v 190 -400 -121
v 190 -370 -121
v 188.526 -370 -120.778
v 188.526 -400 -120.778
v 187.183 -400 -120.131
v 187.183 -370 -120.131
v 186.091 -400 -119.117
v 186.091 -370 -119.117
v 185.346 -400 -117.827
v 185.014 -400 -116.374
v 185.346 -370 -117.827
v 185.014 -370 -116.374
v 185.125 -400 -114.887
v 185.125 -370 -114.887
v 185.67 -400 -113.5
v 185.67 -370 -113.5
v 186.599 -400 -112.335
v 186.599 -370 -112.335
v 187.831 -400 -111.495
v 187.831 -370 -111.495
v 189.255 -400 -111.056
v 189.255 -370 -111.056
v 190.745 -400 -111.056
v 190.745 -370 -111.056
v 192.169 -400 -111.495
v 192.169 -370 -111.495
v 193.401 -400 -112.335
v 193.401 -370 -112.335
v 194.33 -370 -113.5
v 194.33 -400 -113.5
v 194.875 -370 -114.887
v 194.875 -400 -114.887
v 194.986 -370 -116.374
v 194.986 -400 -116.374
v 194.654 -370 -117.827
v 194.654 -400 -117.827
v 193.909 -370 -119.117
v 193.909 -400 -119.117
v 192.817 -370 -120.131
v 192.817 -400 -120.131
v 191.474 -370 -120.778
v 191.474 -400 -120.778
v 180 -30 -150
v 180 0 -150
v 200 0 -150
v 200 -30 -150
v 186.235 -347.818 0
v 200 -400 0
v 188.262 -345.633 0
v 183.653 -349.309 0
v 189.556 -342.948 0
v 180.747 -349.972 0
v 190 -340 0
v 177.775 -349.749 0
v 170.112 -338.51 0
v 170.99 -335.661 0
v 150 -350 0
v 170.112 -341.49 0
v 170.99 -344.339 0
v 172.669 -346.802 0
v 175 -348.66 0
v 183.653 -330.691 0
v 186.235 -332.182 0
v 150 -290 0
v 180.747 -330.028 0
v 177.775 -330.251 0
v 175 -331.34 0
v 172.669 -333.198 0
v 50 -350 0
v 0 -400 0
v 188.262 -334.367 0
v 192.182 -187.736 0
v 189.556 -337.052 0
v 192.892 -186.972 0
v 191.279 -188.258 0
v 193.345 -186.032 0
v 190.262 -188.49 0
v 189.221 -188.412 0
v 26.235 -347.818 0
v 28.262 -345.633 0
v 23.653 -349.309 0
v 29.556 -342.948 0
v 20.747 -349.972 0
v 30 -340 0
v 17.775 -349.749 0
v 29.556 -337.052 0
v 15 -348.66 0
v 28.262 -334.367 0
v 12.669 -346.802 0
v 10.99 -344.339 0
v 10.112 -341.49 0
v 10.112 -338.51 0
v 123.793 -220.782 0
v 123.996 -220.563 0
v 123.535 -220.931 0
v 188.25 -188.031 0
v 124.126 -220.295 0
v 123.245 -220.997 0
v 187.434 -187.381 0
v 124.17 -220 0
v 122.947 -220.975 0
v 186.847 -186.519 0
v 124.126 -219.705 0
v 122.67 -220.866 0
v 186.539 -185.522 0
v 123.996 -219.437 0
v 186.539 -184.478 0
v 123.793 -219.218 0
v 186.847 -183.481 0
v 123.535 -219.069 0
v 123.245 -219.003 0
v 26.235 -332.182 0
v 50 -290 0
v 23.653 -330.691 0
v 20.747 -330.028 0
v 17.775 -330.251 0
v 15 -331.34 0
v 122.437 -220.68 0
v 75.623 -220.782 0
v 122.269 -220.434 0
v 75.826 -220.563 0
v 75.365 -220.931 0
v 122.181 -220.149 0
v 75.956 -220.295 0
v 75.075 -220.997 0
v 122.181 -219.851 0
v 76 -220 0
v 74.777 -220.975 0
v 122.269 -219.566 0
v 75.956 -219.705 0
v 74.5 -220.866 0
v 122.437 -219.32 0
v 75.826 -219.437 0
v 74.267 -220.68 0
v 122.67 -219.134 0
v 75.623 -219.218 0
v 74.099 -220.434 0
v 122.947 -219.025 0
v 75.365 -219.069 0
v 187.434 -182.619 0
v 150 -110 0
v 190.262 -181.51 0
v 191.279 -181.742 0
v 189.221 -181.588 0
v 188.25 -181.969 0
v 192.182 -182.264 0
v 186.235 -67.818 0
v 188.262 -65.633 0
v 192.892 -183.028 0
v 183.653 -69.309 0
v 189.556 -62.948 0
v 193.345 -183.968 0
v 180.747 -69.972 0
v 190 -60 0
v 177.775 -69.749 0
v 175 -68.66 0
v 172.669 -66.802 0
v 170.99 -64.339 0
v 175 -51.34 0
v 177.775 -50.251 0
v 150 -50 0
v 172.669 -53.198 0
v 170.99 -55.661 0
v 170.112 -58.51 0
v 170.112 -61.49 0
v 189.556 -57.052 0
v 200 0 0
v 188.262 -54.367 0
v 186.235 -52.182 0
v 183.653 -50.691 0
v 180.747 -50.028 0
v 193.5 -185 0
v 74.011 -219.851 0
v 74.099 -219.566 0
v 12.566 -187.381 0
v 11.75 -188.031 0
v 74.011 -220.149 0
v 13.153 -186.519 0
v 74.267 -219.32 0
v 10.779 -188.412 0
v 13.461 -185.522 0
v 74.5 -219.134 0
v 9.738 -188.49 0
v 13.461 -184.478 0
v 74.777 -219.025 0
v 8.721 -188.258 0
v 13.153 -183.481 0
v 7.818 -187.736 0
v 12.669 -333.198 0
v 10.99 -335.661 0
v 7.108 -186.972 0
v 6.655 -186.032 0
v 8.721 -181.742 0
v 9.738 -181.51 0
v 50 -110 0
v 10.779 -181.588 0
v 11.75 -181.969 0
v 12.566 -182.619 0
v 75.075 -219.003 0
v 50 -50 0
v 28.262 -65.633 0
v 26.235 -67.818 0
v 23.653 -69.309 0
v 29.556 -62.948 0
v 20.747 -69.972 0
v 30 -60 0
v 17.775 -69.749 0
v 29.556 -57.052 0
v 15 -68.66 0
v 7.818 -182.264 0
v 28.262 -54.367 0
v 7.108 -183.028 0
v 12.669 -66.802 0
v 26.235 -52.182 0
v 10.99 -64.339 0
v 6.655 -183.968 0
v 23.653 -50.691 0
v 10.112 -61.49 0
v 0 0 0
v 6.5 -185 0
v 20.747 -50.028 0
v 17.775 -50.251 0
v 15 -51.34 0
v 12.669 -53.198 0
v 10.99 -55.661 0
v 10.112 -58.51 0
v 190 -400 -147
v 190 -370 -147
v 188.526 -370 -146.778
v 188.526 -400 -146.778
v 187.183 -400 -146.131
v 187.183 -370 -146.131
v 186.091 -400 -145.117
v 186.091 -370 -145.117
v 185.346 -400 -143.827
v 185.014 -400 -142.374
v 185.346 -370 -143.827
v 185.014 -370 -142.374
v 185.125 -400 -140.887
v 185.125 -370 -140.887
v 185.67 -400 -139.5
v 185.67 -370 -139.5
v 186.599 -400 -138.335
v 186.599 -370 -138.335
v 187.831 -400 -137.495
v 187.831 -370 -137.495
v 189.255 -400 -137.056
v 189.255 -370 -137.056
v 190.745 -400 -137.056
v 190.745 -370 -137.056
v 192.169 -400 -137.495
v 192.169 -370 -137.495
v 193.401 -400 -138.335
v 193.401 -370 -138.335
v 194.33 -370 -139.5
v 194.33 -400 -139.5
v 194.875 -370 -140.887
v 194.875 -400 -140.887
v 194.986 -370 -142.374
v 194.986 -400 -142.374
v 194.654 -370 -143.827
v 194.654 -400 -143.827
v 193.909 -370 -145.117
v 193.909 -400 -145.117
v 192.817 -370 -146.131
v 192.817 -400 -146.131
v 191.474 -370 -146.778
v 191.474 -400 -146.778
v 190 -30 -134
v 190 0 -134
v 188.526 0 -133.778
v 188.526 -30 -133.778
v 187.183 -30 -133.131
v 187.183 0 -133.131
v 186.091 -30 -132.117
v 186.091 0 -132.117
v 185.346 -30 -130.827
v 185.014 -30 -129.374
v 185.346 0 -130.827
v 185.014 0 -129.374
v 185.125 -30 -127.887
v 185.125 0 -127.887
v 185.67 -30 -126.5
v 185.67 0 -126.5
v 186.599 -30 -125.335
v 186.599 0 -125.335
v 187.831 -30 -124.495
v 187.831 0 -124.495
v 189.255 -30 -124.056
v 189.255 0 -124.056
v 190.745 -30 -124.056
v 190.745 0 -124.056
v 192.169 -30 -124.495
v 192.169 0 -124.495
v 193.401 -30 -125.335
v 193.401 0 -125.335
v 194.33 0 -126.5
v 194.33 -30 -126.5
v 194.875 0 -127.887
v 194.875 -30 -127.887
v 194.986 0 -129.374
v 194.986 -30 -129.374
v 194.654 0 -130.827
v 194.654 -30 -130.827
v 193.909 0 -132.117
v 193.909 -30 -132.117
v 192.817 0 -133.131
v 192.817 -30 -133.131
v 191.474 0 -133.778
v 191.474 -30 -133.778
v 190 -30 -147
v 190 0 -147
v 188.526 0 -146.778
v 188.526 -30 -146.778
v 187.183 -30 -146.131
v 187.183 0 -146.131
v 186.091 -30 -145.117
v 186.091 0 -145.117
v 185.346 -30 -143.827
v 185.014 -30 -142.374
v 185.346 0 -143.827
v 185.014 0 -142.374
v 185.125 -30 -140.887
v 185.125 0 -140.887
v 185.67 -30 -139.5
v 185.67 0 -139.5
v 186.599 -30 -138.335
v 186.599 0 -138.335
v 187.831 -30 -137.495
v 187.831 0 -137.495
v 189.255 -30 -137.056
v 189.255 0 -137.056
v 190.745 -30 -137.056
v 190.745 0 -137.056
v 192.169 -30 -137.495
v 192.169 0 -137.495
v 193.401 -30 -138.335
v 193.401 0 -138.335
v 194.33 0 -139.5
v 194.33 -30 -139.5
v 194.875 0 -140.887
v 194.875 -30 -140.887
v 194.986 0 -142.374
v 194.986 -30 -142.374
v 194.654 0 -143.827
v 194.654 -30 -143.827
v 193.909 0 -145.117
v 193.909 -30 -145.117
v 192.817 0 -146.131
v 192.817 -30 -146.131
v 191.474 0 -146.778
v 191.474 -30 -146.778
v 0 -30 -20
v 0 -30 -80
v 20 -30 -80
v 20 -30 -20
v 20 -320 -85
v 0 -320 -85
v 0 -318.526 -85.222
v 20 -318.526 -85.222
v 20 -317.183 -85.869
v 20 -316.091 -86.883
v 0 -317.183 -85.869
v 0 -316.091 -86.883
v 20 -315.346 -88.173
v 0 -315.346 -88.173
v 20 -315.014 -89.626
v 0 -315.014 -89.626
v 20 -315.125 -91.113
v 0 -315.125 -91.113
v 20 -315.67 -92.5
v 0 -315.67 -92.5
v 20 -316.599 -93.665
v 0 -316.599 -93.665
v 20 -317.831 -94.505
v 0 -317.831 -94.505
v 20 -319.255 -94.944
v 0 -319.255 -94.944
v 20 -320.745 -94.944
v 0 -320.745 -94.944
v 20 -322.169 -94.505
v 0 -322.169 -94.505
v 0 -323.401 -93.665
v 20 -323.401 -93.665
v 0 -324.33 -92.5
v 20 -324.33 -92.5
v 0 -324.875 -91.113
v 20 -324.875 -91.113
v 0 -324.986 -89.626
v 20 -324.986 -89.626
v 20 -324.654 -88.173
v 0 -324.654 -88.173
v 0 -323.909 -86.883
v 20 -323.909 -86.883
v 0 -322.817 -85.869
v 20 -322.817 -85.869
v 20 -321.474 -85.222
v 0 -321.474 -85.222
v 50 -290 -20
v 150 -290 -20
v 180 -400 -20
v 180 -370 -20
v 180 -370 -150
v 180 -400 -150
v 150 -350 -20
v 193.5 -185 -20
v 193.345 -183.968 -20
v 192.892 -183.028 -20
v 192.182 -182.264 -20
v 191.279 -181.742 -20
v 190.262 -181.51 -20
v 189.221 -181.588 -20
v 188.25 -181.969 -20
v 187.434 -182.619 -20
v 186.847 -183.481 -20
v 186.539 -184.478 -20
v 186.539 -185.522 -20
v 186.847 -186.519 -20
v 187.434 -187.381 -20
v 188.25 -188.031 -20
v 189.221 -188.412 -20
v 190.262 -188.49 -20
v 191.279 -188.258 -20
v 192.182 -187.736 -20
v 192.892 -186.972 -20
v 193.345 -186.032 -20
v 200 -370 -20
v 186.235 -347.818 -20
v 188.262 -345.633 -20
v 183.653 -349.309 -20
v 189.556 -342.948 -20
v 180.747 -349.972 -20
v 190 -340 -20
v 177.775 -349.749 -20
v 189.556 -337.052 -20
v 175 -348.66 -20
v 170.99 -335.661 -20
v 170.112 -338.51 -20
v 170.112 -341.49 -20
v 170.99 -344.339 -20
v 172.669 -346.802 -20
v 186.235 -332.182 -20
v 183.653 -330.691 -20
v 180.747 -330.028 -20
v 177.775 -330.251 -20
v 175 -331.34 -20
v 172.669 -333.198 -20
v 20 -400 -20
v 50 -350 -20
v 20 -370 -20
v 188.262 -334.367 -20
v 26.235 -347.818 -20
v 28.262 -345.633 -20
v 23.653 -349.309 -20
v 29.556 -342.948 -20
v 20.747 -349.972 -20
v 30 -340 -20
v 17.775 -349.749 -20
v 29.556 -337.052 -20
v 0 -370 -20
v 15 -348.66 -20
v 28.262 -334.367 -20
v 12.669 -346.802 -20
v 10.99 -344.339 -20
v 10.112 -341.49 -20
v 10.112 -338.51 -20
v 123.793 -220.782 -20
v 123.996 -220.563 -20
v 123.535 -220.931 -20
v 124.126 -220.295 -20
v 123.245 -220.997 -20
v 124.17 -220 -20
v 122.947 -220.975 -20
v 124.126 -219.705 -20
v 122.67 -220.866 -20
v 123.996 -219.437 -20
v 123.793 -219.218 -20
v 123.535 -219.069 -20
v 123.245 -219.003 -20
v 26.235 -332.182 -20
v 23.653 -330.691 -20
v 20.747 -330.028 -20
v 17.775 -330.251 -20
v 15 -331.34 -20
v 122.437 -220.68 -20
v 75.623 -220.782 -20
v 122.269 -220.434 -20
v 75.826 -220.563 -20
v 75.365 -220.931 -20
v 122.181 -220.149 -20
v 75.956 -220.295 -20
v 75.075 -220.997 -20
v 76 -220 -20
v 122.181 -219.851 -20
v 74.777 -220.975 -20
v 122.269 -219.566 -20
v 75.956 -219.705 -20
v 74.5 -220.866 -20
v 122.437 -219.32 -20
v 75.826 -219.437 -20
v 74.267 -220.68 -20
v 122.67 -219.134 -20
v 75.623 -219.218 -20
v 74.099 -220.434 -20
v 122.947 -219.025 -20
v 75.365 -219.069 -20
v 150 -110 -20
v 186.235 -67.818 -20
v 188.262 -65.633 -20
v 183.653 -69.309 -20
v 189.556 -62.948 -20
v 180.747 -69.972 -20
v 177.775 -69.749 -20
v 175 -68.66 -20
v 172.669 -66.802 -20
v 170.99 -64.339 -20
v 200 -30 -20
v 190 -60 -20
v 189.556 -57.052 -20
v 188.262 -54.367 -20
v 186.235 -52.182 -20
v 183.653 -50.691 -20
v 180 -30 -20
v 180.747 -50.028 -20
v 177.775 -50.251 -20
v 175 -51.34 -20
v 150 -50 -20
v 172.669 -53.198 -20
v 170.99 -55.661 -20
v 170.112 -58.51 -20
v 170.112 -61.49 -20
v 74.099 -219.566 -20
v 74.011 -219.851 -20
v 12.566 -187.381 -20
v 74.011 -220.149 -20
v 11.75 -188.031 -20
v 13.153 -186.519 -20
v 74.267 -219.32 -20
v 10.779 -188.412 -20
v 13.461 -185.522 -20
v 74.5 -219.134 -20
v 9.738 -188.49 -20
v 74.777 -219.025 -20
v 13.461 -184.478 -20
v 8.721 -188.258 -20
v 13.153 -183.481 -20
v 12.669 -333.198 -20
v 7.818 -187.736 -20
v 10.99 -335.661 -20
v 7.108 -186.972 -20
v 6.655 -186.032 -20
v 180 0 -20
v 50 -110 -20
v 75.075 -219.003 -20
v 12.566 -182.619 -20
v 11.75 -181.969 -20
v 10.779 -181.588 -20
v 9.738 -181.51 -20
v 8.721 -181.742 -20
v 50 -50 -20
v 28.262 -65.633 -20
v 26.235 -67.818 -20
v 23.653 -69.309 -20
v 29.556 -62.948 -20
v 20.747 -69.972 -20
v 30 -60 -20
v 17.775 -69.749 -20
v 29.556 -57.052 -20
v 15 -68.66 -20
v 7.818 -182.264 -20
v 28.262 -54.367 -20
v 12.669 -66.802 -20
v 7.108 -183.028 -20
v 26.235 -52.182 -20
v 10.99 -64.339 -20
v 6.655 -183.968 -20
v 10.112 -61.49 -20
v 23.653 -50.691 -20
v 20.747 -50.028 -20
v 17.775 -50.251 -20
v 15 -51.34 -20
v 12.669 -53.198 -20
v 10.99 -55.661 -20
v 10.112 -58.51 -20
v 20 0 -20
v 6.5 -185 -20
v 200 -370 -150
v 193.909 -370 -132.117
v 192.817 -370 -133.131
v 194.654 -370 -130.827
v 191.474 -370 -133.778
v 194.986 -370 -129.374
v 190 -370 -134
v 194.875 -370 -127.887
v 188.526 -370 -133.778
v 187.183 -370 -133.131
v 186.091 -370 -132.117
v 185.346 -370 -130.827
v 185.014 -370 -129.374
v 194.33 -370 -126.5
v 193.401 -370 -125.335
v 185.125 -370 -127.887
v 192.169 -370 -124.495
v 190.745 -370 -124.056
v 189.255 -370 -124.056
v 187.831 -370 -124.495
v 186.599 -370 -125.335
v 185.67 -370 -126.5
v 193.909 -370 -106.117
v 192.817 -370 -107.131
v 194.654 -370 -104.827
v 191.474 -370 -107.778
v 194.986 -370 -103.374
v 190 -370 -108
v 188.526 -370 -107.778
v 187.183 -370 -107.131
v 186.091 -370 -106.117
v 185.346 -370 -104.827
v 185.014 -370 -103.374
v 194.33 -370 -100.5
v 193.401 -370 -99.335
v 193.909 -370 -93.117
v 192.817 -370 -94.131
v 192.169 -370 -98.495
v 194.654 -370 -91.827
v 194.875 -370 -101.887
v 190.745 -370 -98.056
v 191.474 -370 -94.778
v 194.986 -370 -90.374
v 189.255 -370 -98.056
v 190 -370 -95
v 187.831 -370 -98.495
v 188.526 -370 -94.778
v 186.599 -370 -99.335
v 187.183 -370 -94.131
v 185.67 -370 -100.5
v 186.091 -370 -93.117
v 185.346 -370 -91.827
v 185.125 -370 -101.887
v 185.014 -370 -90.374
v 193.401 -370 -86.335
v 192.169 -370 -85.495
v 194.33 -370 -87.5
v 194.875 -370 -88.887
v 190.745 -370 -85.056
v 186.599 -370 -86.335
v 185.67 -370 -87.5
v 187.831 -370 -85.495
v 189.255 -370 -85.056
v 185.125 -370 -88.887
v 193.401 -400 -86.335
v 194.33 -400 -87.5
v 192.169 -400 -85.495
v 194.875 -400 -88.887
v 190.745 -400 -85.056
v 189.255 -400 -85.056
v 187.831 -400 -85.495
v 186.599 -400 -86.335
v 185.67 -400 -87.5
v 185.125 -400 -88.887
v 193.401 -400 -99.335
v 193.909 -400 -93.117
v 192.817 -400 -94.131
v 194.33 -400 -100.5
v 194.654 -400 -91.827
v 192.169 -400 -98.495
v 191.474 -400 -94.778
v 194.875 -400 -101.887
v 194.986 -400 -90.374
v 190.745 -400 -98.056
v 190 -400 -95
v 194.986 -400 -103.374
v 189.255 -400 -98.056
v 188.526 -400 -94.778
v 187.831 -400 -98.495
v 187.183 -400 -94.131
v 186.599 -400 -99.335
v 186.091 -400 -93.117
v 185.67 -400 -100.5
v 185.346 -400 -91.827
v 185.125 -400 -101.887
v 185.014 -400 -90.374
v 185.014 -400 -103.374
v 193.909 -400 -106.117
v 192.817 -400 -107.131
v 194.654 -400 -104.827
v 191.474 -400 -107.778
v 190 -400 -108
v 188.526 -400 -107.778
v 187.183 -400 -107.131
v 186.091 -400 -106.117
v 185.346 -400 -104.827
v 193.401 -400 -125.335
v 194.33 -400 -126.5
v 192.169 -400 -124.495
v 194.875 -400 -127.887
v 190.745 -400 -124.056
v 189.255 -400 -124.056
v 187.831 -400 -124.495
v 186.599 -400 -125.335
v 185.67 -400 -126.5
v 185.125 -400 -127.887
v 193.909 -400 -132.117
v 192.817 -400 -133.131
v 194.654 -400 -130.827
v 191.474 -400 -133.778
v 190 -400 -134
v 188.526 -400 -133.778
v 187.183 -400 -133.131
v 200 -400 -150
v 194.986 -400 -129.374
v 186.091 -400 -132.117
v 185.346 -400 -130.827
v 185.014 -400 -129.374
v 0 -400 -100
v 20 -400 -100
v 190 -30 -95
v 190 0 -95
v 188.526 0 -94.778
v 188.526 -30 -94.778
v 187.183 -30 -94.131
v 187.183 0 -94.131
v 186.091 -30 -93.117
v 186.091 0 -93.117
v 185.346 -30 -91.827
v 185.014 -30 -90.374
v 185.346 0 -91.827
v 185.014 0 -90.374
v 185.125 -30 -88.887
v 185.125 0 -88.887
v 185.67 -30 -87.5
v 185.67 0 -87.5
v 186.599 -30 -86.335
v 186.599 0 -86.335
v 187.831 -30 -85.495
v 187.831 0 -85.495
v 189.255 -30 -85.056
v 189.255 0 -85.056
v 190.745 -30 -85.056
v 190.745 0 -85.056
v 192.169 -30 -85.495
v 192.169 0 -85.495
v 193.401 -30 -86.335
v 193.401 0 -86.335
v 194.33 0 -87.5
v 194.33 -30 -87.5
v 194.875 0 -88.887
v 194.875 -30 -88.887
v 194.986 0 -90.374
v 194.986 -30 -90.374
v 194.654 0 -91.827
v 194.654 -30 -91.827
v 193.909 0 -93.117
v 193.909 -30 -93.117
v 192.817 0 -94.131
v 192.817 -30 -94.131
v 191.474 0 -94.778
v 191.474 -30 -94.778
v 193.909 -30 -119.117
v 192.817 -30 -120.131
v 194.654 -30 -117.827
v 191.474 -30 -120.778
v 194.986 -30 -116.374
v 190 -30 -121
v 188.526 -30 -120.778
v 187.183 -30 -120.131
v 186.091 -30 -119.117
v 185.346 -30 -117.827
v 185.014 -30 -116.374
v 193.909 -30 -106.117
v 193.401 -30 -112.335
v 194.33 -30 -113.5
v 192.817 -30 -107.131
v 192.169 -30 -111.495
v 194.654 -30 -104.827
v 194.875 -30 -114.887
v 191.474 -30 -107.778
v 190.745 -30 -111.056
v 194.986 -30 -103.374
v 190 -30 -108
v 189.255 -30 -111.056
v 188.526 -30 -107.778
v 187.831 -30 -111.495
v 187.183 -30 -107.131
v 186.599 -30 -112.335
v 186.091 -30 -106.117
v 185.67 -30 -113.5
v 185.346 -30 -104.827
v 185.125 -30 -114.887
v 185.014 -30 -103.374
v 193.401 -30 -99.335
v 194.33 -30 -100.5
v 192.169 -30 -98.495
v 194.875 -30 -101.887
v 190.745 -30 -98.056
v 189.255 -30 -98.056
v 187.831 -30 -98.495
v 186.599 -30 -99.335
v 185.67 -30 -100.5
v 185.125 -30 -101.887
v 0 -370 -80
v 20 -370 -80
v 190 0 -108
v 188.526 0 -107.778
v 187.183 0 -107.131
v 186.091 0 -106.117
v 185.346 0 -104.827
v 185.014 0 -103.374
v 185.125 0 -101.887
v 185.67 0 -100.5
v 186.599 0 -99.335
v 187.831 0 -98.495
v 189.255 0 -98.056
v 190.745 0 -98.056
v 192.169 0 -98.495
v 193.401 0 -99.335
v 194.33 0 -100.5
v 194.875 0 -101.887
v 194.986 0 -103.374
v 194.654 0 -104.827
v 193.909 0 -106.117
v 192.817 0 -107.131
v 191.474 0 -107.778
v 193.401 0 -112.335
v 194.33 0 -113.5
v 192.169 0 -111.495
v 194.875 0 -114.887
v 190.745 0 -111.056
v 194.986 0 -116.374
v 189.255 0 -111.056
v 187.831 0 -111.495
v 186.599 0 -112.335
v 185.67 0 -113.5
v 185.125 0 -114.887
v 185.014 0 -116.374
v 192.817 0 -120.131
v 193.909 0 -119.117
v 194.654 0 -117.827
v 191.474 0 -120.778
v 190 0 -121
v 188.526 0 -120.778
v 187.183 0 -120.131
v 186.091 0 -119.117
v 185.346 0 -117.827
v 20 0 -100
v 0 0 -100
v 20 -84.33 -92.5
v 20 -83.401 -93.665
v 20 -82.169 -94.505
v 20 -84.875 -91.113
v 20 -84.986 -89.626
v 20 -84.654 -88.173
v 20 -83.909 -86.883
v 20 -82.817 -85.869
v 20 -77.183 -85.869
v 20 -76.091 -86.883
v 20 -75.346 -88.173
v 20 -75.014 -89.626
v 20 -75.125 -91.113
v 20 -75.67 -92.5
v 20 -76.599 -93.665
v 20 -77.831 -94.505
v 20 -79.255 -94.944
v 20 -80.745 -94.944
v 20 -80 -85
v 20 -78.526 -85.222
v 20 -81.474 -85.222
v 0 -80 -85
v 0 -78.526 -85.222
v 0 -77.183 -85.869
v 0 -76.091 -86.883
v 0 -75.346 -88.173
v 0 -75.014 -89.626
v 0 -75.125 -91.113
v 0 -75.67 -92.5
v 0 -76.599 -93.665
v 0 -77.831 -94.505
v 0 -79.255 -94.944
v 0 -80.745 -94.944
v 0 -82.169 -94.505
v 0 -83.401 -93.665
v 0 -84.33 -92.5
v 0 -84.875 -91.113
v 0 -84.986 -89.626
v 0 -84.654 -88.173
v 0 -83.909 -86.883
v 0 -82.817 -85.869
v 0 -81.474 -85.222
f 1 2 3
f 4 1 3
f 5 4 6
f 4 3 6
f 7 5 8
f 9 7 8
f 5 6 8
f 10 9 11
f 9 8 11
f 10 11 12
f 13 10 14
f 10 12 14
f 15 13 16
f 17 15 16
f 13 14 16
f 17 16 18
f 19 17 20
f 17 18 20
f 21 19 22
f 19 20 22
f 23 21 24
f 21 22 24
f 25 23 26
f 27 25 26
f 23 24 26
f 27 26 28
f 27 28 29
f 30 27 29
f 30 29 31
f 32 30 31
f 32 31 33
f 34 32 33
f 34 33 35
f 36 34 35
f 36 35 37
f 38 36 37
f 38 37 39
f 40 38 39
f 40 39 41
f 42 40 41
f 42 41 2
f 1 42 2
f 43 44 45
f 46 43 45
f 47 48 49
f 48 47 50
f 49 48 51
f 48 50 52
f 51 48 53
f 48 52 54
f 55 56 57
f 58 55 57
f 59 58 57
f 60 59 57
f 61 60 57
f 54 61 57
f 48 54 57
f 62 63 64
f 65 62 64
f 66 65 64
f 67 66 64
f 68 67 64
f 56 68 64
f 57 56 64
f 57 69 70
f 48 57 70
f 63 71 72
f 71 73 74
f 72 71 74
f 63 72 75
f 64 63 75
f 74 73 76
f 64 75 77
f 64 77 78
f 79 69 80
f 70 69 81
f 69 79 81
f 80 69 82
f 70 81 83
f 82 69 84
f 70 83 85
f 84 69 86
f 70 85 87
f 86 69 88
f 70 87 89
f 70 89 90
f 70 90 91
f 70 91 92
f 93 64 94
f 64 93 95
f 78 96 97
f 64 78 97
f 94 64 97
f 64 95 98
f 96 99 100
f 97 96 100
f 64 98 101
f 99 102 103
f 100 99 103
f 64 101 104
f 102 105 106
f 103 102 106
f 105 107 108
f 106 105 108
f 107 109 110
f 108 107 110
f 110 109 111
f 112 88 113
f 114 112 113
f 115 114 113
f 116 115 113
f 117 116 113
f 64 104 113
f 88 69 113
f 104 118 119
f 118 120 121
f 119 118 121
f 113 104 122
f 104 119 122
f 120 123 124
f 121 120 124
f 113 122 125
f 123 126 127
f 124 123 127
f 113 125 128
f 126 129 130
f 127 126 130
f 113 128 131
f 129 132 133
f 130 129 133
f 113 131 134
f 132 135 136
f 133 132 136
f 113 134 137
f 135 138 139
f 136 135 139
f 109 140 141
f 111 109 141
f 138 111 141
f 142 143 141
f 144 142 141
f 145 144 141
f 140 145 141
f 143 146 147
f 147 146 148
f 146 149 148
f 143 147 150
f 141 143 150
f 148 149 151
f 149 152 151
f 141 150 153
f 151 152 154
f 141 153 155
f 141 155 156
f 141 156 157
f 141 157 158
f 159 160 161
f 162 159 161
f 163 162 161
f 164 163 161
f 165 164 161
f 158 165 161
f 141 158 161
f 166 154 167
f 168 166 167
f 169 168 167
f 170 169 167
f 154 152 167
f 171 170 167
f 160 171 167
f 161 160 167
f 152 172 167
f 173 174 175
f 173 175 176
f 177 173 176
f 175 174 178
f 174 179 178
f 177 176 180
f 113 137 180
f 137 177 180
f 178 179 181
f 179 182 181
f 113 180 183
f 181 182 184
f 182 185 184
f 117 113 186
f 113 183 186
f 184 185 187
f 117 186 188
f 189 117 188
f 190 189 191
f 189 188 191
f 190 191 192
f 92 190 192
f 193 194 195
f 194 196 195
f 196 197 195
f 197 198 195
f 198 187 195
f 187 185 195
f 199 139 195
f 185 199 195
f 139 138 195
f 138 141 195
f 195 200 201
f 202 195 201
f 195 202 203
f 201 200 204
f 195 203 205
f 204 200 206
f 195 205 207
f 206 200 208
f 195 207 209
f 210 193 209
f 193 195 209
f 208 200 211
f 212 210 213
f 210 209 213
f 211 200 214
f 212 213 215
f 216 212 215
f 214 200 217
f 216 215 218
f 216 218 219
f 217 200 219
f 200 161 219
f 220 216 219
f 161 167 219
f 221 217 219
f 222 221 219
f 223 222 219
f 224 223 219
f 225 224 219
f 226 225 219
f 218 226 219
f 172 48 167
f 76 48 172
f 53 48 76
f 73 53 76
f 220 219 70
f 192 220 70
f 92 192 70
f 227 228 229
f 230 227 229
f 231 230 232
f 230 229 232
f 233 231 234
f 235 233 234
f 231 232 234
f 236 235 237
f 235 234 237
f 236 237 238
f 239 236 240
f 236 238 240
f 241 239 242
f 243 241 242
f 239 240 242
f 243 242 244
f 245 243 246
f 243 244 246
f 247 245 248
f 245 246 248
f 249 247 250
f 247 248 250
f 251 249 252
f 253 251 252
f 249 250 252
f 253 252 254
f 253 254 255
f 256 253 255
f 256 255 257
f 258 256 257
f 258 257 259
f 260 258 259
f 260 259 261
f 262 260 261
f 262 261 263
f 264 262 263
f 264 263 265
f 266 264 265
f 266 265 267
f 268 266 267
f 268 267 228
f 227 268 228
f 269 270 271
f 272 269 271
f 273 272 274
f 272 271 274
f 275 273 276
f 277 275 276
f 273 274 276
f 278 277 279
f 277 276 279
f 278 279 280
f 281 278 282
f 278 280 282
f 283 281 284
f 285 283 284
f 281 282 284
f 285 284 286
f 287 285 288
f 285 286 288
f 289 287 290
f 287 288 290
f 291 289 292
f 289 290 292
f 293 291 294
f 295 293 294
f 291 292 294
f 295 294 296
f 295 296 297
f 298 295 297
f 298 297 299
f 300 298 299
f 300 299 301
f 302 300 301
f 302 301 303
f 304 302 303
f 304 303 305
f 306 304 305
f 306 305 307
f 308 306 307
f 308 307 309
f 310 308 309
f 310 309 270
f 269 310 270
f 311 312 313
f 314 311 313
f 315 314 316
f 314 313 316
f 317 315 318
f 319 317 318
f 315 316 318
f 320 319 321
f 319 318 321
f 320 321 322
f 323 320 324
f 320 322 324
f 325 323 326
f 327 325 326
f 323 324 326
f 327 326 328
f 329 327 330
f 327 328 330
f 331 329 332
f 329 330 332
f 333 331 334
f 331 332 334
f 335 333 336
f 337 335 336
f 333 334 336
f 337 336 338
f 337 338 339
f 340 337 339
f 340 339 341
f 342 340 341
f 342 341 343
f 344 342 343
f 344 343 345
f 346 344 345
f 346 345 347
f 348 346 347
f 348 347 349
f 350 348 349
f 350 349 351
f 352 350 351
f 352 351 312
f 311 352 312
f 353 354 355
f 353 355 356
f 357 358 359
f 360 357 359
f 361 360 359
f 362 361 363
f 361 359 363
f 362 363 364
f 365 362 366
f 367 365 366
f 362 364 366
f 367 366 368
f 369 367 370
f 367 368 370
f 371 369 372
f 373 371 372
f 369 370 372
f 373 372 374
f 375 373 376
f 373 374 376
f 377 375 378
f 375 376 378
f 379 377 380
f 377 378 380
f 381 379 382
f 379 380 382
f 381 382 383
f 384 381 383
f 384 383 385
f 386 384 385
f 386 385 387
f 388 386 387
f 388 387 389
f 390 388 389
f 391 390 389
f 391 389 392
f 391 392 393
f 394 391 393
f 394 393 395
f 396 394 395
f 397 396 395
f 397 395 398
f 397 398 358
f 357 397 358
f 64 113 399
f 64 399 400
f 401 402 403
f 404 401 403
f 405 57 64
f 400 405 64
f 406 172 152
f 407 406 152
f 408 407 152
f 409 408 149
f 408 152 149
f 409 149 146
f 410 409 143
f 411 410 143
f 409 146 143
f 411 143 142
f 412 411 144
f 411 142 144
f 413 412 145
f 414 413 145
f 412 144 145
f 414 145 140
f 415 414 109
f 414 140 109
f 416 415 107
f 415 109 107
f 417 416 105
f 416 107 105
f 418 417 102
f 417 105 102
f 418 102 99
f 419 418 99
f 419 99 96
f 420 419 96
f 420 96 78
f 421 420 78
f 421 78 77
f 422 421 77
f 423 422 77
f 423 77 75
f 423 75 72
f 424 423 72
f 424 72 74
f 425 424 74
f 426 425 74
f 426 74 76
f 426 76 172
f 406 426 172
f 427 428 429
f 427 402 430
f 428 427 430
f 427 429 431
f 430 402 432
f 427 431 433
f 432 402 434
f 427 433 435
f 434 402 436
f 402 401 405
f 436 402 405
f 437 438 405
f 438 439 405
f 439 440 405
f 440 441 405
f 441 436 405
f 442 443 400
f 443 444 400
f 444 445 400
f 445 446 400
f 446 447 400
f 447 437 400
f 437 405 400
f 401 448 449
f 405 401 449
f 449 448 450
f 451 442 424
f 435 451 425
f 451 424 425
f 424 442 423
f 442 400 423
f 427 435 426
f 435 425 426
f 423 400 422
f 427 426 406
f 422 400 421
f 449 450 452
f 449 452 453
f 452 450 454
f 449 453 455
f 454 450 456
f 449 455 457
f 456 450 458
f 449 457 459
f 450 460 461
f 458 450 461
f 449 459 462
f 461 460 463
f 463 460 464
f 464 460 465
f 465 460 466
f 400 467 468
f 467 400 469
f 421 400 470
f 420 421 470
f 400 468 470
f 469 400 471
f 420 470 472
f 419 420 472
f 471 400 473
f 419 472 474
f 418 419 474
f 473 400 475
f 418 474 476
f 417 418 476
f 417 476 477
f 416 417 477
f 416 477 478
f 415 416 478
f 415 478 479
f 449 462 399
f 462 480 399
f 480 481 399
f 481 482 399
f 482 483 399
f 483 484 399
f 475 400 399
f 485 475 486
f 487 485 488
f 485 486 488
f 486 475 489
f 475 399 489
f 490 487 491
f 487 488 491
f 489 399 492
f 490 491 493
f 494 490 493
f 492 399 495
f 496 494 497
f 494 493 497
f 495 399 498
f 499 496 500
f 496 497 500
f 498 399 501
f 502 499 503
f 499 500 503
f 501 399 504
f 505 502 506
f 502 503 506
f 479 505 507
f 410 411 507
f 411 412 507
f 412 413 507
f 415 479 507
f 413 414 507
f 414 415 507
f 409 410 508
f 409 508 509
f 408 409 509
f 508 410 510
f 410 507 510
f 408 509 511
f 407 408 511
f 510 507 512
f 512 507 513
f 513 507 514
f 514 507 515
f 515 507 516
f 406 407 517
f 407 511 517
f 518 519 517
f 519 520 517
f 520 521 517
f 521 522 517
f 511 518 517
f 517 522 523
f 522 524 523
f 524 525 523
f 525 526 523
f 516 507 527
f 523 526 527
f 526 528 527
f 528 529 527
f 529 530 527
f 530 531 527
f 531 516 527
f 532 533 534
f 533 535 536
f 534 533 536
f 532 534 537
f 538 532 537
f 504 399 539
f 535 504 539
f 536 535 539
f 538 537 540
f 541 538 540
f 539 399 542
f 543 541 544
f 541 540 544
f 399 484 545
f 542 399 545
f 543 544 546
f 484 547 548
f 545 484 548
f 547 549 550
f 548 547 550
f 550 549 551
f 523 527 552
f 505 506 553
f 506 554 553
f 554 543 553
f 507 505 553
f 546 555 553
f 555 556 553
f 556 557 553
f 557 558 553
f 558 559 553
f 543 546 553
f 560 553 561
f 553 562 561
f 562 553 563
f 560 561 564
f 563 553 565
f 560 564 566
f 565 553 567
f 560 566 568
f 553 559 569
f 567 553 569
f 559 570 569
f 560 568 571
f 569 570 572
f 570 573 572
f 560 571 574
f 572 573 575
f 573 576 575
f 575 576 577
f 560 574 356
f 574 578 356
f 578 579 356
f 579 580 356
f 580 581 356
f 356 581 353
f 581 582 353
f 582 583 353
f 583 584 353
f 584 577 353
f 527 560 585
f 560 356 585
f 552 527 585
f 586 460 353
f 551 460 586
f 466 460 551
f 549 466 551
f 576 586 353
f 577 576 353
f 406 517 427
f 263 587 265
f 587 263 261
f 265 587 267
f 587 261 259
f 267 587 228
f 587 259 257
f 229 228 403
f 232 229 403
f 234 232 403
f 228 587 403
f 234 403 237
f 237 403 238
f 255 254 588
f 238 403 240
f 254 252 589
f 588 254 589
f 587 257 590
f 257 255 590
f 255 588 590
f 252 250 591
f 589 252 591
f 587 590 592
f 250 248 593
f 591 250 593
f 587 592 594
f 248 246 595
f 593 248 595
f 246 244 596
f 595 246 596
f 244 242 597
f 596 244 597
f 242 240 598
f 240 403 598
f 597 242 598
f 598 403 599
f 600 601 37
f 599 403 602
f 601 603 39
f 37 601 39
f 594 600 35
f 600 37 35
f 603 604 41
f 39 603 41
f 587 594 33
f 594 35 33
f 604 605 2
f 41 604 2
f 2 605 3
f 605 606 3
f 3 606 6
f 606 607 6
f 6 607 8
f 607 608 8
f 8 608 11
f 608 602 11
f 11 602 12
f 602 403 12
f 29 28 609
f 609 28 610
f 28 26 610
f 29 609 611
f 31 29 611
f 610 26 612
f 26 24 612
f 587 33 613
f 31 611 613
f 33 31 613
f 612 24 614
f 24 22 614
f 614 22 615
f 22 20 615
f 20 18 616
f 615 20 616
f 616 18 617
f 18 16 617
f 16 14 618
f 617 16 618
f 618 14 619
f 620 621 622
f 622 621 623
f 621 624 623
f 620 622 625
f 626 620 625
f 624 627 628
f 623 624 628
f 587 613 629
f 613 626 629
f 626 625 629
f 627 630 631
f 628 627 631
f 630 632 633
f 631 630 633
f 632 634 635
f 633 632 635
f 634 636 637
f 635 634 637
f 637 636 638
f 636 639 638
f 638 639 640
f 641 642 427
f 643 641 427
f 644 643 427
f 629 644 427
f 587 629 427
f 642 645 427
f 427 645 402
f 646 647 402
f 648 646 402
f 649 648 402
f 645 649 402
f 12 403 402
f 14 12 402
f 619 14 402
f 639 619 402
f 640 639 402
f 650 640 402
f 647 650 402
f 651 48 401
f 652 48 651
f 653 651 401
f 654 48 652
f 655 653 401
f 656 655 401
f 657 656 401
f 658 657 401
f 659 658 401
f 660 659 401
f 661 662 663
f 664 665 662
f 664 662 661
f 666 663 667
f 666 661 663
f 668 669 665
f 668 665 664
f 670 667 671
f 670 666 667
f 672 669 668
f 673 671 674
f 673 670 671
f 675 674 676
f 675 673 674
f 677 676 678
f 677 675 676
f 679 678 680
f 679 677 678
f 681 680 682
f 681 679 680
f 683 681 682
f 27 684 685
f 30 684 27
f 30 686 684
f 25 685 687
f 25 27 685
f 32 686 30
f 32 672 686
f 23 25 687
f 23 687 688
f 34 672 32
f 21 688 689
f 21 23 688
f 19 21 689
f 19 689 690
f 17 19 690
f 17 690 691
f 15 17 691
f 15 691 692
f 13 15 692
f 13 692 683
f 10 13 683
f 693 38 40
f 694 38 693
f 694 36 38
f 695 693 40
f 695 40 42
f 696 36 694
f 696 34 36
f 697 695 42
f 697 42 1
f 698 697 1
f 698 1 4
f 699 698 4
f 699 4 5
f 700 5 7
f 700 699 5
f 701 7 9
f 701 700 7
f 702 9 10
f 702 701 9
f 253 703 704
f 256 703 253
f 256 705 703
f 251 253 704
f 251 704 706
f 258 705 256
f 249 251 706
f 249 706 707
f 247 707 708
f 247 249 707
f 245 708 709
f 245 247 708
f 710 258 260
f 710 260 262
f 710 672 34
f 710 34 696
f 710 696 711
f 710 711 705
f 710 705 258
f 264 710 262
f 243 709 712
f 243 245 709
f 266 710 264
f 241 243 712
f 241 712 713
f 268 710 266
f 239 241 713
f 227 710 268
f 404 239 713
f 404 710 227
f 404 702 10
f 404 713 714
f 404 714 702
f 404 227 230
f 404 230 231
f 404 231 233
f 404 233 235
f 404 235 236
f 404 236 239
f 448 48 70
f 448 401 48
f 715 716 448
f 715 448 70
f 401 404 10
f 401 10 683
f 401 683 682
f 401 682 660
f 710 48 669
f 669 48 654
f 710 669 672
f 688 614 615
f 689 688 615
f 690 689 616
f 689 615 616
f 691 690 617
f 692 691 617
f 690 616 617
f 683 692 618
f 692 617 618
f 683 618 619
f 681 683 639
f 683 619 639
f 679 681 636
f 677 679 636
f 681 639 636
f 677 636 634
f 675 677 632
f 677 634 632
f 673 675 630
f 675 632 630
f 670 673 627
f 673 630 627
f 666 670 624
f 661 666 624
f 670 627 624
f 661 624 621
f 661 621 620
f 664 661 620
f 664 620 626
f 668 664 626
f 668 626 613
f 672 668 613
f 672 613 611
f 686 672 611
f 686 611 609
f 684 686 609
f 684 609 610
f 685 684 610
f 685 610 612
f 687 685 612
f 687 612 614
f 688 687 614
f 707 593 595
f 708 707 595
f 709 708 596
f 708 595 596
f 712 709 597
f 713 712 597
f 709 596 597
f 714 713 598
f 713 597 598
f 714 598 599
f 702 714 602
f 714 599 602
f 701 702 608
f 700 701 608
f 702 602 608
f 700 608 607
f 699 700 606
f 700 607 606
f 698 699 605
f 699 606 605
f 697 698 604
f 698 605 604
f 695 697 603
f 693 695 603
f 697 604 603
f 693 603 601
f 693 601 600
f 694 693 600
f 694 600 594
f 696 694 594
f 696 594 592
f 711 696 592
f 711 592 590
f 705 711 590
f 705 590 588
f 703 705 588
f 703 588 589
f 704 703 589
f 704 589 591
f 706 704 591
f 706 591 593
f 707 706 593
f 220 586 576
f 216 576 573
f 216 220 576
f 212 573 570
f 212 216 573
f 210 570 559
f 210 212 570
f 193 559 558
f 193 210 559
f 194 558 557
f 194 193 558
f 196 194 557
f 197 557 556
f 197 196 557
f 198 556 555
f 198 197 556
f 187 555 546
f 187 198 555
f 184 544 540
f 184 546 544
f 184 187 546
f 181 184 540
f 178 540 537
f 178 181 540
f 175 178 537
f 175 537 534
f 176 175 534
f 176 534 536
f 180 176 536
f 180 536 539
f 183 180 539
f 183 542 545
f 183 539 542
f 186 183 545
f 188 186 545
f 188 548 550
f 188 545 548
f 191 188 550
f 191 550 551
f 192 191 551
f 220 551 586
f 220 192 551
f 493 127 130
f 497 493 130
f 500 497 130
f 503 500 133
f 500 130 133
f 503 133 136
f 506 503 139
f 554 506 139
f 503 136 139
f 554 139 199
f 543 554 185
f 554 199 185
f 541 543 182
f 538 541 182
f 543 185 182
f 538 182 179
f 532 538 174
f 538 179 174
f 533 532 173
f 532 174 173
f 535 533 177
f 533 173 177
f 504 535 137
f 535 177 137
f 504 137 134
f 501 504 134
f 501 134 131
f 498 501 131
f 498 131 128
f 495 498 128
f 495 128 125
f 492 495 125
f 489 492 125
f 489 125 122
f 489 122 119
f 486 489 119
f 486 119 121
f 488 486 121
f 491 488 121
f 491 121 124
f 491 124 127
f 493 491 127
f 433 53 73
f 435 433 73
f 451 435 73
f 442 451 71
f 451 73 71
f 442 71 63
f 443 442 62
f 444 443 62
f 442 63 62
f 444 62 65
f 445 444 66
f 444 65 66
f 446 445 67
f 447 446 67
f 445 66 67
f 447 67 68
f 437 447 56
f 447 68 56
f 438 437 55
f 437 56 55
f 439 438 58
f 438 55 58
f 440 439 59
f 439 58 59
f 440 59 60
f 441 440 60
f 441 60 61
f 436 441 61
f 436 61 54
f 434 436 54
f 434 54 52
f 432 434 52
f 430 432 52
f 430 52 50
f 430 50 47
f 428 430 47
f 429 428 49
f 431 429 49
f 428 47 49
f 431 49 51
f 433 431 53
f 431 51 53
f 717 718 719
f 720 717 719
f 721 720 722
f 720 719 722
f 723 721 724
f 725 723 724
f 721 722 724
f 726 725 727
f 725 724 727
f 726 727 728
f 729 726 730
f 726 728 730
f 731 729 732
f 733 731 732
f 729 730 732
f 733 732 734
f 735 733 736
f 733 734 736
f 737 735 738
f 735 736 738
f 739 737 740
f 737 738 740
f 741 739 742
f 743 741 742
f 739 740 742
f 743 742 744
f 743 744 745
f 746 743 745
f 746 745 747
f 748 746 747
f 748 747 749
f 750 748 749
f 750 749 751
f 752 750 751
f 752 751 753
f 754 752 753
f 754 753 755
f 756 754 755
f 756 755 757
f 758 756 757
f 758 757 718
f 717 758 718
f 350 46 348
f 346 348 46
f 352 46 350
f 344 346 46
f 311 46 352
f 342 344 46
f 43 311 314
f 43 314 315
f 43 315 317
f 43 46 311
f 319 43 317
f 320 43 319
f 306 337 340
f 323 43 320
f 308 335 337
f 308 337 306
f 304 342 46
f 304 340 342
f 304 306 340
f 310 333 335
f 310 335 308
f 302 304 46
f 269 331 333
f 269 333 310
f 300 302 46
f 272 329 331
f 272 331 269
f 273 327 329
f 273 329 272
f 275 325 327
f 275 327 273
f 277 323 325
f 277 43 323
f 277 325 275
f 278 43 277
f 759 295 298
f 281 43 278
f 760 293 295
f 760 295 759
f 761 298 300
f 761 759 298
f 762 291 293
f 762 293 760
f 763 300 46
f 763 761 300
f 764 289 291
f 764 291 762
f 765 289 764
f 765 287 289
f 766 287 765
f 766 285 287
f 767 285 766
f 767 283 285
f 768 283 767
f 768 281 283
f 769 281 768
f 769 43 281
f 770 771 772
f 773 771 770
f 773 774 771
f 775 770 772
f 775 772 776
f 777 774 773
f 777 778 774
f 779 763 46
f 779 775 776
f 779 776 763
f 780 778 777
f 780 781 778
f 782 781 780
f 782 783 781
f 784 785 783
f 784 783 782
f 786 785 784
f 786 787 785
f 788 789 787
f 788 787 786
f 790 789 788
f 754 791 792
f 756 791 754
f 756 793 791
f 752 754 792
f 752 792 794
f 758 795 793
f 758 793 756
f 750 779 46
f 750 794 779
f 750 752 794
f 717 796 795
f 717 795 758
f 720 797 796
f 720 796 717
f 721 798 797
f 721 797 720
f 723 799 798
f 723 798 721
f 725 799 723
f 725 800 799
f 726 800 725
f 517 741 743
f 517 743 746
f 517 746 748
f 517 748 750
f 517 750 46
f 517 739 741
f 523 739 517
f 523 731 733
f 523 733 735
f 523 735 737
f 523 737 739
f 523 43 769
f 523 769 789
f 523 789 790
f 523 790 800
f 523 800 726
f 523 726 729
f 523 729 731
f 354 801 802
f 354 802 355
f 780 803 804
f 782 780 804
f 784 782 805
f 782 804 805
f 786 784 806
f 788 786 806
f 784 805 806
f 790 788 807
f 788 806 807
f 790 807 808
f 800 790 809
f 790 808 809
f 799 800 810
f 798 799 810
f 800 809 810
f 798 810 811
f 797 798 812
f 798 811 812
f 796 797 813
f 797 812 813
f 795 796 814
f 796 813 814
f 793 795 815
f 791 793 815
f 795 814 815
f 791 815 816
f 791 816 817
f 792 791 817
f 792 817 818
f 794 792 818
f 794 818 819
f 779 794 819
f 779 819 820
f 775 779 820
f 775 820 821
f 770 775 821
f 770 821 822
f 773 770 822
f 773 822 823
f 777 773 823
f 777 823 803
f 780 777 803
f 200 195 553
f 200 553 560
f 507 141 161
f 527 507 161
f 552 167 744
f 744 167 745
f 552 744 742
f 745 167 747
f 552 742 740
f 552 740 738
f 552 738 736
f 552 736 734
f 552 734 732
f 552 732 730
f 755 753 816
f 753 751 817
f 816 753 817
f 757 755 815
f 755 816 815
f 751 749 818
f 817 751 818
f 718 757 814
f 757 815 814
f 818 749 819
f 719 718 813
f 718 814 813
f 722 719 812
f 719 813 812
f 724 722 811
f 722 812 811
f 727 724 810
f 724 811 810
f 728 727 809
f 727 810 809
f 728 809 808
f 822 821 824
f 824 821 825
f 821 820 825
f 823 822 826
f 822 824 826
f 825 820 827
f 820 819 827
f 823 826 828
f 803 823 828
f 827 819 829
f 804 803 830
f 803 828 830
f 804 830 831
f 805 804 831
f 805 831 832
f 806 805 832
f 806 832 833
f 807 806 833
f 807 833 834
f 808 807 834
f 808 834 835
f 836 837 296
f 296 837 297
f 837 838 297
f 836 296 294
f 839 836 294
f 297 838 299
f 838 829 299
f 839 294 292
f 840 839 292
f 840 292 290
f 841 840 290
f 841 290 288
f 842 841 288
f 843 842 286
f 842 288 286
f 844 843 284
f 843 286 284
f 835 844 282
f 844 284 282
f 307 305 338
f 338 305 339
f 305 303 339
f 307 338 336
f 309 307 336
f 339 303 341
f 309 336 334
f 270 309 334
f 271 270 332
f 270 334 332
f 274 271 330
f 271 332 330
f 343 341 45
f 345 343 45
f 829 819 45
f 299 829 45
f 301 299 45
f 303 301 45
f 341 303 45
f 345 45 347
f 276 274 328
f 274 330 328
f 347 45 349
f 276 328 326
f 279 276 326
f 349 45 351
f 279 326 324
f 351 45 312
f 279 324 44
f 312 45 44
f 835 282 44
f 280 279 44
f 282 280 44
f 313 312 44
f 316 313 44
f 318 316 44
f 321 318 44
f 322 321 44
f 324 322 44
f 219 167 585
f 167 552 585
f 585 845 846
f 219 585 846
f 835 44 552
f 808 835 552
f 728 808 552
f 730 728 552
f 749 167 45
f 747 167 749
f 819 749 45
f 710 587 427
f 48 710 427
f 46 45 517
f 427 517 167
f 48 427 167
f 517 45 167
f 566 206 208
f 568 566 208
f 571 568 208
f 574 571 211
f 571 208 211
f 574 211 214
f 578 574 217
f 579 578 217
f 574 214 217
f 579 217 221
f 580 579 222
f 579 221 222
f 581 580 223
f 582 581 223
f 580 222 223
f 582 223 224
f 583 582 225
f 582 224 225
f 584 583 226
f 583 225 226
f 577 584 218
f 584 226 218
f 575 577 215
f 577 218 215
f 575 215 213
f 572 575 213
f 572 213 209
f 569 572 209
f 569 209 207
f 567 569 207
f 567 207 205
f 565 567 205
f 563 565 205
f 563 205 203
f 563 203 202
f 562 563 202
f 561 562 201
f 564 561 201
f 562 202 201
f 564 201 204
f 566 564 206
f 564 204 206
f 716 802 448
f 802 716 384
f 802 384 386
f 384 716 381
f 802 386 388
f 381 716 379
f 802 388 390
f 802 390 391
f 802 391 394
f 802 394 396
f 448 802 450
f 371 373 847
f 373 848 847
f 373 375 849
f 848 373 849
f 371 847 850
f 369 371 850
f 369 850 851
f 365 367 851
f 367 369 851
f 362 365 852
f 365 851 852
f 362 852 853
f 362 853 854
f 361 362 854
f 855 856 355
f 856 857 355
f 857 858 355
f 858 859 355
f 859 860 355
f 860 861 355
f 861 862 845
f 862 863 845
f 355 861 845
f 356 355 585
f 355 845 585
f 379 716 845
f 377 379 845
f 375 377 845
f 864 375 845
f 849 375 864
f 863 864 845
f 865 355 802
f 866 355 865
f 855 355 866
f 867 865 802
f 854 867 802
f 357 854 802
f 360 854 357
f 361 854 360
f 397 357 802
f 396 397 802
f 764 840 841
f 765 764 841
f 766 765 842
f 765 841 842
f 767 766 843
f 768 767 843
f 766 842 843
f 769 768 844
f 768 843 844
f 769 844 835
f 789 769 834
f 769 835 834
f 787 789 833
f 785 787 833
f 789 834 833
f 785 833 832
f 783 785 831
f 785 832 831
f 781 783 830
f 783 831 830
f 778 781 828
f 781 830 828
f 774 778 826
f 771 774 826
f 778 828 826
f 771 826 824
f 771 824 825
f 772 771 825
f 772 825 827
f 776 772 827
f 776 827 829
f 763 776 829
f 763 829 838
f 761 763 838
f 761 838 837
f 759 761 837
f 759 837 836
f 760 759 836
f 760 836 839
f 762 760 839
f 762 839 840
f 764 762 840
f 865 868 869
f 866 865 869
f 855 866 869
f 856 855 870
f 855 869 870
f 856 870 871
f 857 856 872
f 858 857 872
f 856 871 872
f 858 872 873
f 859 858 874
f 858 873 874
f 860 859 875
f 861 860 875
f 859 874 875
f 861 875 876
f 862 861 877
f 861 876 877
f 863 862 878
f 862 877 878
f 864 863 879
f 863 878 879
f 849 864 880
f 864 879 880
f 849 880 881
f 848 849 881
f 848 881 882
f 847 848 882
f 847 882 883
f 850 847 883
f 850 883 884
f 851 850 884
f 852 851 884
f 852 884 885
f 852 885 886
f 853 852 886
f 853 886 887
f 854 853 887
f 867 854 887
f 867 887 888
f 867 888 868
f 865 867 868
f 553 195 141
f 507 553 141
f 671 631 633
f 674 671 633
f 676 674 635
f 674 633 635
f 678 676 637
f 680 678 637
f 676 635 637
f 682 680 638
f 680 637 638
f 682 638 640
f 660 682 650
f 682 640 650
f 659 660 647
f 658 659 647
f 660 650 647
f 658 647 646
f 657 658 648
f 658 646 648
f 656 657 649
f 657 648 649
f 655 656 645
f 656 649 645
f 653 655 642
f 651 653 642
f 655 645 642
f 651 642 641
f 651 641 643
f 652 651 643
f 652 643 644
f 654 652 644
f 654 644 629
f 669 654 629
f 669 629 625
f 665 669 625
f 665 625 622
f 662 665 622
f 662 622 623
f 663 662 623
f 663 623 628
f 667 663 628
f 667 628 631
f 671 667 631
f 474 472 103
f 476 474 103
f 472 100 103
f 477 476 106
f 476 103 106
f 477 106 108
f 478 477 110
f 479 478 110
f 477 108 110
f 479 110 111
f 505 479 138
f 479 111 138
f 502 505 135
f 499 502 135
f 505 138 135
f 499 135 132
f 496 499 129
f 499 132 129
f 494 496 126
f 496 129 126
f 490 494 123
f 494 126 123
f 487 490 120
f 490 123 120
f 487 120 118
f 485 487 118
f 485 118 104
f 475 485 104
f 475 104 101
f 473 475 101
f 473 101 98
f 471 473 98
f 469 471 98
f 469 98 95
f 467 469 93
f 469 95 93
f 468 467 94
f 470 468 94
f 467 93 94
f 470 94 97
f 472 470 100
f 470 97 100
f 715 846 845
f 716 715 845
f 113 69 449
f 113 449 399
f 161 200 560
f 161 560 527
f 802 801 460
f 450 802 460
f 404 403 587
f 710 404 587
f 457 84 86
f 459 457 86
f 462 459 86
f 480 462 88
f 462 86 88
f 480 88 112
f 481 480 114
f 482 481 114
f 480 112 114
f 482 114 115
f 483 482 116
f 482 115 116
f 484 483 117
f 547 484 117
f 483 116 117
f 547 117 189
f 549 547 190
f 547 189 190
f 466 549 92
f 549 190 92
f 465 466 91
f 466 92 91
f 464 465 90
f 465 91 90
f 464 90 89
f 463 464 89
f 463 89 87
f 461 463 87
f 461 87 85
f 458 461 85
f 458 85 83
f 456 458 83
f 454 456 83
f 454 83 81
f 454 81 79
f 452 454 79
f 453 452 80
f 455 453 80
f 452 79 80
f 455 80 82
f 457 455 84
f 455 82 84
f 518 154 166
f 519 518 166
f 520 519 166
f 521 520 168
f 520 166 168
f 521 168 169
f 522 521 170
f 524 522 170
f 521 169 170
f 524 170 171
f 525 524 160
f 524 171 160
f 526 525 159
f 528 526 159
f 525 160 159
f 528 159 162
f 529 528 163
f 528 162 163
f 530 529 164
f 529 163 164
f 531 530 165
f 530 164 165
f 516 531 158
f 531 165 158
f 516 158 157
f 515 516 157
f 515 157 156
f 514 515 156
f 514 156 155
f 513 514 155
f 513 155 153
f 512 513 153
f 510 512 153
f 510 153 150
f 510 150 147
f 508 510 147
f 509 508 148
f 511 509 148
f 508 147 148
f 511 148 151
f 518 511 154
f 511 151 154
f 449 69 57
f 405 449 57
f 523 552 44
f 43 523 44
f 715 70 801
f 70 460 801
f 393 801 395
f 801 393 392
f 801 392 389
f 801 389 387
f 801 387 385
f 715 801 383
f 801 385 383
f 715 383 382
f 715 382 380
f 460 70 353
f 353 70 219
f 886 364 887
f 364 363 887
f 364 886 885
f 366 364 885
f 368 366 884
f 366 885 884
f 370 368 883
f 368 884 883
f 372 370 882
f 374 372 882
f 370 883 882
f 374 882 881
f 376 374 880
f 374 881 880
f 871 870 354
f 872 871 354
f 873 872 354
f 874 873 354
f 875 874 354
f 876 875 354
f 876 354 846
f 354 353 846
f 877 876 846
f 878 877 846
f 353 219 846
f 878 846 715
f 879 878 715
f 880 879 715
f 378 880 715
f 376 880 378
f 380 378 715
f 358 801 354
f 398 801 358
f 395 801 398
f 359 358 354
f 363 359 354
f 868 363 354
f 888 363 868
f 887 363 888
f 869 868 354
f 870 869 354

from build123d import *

# Parameters (mm, degrees)
BOSS_EXTRUDE1_DEPTH = 400
SKETCH3_W           = 100
SKETCH3_H           = 300
CUT_EXTRUDE1_DEPTH  = 400
SKETCH4_W           = 60
SKETCH4_H           = 340
CUT_EXTRUDE2_DEPTH  = 400
SKETCH5_W           = 70
SKETCH5_H           = 340
CUT_EXTRUDE4_DEPTH  = 118
SKETCH6_R           = 5
CUT_EXTRUDE5_DEPTH  = 543
SKETCH7_R           = 5
CUT_EXTRUDE6_DEPTH  = 193
SKETCH8_R           = 10
CUT_EXTRUDE7_DEPTH  = 20
SKETCH9_W           = 100
SKETCH9_H           = 180
BOSS_EXTRUDE2_DEPTH = 20
SKETCH11_R          = 1
CUT_EXTRUDE8_DEPTH  = 26.5
SKETCH12_R          = 3.5
CUT_EXTRUDE9_DEPTH  = 35


with BuildPart() as part:
    # Sketch2 → Boss-Extrude1 (new body)
    with BuildSketch(Plane(origin=(0, 0, 0), x_dir=(1, 0, 0), z_dir=(0, 1, 0))):
        Polygon((0, 0), (0, 100), (20, 100), (20, 20), (180, 20), (180, 150), (200, 150), (200, 0), align=None)
    extrude(amount=-BOSS_EXTRUDE1_DEPTH)

    # Sketch3 → Cut-Extrude1 (cut)
    with BuildSketch(Plane.XY):
        with Locations((100, -200)):
            Rectangle(SKETCH3_W, SKETCH3_H)
    extrude(amount=-CUT_EXTRUDE1_DEPTH, mode=Mode.SUBTRACT)

    # Sketch4 → Cut-Extrude2 (cut)
    with BuildSketch(Plane.ZY):
        with Locations((-50, -200)):
            Rectangle(SKETCH4_W, SKETCH4_H)
    extrude(amount=-CUT_EXTRUDE2_DEPTH, mode=Mode.SUBTRACT)

    # Sketch5 → Cut-Extrude4 (cut)
    with BuildSketch(Plane(origin=(200, 0, 0), x_dir=(0, 0, -1), z_dir=(1, 0, 0))):
        with Locations((115, -200)):
            Rectangle(SKETCH5_W, SKETCH5_H)
    extrude(amount=-CUT_EXTRUDE4_DEPTH, mode=Mode.SUBTRACT)

    # Sketch6 → Cut-Extrude5 (cut)
    with BuildSketch(Plane(origin=(0, 0, 0), x_dir=(1, 0, 0), z_dir=(0, 1, 0))):
        with Locations(Location((190, 142, 0), (0, 0, 90))):
            Circle(SKETCH6_R)
        with Locations(Location((190, 129, 0), (0, 0, 90))):
            Circle(SKETCH6_R)
        with Locations(Location((190, 116, 0), (0, 0, 90))):
            Circle(SKETCH6_R)
        with Locations(Location((190, 103, 0), (0, 0, 90))):
            Circle(SKETCH6_R)
        with Locations(Location((190, 90, 0), (0, 0, 90))):
            Circle(SKETCH6_R)
    extrude(amount=-CUT_EXTRUDE5_DEPTH, mode=Mode.SUBTRACT)

    # Sketch7 → Cut-Extrude6 (cut)
    with BuildSketch(Plane.ZY):
        with Locations((-90, -80)):
            Circle(SKETCH7_R)
        with Locations((-90, -320)):
            Circle(SKETCH7_R)
    extrude(amount=-CUT_EXTRUDE6_DEPTH, mode=Mode.SUBTRACT)

    # Sketch8 → Cut-Extrude7 (cut)
    with BuildSketch(Plane.XY):
        with Locations((180, -60)):
            Circle(SKETCH8_R)
        with Locations((20, -60)):
            Circle(SKETCH8_R)
        with Locations((180, -340)):
            Circle(SKETCH8_R)
        with Locations((20, -340)):
            Circle(SKETCH8_R)
    extrude(amount=-CUT_EXTRUDE7_DEPTH, mode=Mode.SUBTRACT)

    # Sketch9 → Boss-Extrude2 (add)
    with BuildSketch(Plane.XY):
        with Locations((100, -200)):
            Rectangle(SKETCH9_W, SKETCH9_H)
    extrude(amount=-BOSS_EXTRUDE2_DEPTH)

    # Sketch11 → Cut-Extrude8 (cut, symmetric)
    with BuildSketch(Plane.XY):
        with Locations((75, -220)):
            Circle(SKETCH11_R)
        with Locations((123.17, -220)):
            Circle(SKETCH11_R)
    extrude(amount=CUT_EXTRUDE8_DEPTH, both=True, mode=Mode.SUBTRACT)

    # Sketch12 → Cut-Extrude9 (cut)
    with BuildSketch(Plane.XY):
        with Locations((190, -185)):
            Circle(SKETCH12_R)
    cut_extrude9 = extrude(amount=-CUT_EXTRUDE9_DEPTH, mode=Mode.SUBTRACT)

    # Mirror1: Cut-Extrude9 across plane
    add(cut_extrude9.mirror(Plane(origin=(100, 0, 0), x_dir=(0, 0, 1), z_dir=(1, 0, 0))), mode=Mode.SUBTRACT)


solid = part.part
